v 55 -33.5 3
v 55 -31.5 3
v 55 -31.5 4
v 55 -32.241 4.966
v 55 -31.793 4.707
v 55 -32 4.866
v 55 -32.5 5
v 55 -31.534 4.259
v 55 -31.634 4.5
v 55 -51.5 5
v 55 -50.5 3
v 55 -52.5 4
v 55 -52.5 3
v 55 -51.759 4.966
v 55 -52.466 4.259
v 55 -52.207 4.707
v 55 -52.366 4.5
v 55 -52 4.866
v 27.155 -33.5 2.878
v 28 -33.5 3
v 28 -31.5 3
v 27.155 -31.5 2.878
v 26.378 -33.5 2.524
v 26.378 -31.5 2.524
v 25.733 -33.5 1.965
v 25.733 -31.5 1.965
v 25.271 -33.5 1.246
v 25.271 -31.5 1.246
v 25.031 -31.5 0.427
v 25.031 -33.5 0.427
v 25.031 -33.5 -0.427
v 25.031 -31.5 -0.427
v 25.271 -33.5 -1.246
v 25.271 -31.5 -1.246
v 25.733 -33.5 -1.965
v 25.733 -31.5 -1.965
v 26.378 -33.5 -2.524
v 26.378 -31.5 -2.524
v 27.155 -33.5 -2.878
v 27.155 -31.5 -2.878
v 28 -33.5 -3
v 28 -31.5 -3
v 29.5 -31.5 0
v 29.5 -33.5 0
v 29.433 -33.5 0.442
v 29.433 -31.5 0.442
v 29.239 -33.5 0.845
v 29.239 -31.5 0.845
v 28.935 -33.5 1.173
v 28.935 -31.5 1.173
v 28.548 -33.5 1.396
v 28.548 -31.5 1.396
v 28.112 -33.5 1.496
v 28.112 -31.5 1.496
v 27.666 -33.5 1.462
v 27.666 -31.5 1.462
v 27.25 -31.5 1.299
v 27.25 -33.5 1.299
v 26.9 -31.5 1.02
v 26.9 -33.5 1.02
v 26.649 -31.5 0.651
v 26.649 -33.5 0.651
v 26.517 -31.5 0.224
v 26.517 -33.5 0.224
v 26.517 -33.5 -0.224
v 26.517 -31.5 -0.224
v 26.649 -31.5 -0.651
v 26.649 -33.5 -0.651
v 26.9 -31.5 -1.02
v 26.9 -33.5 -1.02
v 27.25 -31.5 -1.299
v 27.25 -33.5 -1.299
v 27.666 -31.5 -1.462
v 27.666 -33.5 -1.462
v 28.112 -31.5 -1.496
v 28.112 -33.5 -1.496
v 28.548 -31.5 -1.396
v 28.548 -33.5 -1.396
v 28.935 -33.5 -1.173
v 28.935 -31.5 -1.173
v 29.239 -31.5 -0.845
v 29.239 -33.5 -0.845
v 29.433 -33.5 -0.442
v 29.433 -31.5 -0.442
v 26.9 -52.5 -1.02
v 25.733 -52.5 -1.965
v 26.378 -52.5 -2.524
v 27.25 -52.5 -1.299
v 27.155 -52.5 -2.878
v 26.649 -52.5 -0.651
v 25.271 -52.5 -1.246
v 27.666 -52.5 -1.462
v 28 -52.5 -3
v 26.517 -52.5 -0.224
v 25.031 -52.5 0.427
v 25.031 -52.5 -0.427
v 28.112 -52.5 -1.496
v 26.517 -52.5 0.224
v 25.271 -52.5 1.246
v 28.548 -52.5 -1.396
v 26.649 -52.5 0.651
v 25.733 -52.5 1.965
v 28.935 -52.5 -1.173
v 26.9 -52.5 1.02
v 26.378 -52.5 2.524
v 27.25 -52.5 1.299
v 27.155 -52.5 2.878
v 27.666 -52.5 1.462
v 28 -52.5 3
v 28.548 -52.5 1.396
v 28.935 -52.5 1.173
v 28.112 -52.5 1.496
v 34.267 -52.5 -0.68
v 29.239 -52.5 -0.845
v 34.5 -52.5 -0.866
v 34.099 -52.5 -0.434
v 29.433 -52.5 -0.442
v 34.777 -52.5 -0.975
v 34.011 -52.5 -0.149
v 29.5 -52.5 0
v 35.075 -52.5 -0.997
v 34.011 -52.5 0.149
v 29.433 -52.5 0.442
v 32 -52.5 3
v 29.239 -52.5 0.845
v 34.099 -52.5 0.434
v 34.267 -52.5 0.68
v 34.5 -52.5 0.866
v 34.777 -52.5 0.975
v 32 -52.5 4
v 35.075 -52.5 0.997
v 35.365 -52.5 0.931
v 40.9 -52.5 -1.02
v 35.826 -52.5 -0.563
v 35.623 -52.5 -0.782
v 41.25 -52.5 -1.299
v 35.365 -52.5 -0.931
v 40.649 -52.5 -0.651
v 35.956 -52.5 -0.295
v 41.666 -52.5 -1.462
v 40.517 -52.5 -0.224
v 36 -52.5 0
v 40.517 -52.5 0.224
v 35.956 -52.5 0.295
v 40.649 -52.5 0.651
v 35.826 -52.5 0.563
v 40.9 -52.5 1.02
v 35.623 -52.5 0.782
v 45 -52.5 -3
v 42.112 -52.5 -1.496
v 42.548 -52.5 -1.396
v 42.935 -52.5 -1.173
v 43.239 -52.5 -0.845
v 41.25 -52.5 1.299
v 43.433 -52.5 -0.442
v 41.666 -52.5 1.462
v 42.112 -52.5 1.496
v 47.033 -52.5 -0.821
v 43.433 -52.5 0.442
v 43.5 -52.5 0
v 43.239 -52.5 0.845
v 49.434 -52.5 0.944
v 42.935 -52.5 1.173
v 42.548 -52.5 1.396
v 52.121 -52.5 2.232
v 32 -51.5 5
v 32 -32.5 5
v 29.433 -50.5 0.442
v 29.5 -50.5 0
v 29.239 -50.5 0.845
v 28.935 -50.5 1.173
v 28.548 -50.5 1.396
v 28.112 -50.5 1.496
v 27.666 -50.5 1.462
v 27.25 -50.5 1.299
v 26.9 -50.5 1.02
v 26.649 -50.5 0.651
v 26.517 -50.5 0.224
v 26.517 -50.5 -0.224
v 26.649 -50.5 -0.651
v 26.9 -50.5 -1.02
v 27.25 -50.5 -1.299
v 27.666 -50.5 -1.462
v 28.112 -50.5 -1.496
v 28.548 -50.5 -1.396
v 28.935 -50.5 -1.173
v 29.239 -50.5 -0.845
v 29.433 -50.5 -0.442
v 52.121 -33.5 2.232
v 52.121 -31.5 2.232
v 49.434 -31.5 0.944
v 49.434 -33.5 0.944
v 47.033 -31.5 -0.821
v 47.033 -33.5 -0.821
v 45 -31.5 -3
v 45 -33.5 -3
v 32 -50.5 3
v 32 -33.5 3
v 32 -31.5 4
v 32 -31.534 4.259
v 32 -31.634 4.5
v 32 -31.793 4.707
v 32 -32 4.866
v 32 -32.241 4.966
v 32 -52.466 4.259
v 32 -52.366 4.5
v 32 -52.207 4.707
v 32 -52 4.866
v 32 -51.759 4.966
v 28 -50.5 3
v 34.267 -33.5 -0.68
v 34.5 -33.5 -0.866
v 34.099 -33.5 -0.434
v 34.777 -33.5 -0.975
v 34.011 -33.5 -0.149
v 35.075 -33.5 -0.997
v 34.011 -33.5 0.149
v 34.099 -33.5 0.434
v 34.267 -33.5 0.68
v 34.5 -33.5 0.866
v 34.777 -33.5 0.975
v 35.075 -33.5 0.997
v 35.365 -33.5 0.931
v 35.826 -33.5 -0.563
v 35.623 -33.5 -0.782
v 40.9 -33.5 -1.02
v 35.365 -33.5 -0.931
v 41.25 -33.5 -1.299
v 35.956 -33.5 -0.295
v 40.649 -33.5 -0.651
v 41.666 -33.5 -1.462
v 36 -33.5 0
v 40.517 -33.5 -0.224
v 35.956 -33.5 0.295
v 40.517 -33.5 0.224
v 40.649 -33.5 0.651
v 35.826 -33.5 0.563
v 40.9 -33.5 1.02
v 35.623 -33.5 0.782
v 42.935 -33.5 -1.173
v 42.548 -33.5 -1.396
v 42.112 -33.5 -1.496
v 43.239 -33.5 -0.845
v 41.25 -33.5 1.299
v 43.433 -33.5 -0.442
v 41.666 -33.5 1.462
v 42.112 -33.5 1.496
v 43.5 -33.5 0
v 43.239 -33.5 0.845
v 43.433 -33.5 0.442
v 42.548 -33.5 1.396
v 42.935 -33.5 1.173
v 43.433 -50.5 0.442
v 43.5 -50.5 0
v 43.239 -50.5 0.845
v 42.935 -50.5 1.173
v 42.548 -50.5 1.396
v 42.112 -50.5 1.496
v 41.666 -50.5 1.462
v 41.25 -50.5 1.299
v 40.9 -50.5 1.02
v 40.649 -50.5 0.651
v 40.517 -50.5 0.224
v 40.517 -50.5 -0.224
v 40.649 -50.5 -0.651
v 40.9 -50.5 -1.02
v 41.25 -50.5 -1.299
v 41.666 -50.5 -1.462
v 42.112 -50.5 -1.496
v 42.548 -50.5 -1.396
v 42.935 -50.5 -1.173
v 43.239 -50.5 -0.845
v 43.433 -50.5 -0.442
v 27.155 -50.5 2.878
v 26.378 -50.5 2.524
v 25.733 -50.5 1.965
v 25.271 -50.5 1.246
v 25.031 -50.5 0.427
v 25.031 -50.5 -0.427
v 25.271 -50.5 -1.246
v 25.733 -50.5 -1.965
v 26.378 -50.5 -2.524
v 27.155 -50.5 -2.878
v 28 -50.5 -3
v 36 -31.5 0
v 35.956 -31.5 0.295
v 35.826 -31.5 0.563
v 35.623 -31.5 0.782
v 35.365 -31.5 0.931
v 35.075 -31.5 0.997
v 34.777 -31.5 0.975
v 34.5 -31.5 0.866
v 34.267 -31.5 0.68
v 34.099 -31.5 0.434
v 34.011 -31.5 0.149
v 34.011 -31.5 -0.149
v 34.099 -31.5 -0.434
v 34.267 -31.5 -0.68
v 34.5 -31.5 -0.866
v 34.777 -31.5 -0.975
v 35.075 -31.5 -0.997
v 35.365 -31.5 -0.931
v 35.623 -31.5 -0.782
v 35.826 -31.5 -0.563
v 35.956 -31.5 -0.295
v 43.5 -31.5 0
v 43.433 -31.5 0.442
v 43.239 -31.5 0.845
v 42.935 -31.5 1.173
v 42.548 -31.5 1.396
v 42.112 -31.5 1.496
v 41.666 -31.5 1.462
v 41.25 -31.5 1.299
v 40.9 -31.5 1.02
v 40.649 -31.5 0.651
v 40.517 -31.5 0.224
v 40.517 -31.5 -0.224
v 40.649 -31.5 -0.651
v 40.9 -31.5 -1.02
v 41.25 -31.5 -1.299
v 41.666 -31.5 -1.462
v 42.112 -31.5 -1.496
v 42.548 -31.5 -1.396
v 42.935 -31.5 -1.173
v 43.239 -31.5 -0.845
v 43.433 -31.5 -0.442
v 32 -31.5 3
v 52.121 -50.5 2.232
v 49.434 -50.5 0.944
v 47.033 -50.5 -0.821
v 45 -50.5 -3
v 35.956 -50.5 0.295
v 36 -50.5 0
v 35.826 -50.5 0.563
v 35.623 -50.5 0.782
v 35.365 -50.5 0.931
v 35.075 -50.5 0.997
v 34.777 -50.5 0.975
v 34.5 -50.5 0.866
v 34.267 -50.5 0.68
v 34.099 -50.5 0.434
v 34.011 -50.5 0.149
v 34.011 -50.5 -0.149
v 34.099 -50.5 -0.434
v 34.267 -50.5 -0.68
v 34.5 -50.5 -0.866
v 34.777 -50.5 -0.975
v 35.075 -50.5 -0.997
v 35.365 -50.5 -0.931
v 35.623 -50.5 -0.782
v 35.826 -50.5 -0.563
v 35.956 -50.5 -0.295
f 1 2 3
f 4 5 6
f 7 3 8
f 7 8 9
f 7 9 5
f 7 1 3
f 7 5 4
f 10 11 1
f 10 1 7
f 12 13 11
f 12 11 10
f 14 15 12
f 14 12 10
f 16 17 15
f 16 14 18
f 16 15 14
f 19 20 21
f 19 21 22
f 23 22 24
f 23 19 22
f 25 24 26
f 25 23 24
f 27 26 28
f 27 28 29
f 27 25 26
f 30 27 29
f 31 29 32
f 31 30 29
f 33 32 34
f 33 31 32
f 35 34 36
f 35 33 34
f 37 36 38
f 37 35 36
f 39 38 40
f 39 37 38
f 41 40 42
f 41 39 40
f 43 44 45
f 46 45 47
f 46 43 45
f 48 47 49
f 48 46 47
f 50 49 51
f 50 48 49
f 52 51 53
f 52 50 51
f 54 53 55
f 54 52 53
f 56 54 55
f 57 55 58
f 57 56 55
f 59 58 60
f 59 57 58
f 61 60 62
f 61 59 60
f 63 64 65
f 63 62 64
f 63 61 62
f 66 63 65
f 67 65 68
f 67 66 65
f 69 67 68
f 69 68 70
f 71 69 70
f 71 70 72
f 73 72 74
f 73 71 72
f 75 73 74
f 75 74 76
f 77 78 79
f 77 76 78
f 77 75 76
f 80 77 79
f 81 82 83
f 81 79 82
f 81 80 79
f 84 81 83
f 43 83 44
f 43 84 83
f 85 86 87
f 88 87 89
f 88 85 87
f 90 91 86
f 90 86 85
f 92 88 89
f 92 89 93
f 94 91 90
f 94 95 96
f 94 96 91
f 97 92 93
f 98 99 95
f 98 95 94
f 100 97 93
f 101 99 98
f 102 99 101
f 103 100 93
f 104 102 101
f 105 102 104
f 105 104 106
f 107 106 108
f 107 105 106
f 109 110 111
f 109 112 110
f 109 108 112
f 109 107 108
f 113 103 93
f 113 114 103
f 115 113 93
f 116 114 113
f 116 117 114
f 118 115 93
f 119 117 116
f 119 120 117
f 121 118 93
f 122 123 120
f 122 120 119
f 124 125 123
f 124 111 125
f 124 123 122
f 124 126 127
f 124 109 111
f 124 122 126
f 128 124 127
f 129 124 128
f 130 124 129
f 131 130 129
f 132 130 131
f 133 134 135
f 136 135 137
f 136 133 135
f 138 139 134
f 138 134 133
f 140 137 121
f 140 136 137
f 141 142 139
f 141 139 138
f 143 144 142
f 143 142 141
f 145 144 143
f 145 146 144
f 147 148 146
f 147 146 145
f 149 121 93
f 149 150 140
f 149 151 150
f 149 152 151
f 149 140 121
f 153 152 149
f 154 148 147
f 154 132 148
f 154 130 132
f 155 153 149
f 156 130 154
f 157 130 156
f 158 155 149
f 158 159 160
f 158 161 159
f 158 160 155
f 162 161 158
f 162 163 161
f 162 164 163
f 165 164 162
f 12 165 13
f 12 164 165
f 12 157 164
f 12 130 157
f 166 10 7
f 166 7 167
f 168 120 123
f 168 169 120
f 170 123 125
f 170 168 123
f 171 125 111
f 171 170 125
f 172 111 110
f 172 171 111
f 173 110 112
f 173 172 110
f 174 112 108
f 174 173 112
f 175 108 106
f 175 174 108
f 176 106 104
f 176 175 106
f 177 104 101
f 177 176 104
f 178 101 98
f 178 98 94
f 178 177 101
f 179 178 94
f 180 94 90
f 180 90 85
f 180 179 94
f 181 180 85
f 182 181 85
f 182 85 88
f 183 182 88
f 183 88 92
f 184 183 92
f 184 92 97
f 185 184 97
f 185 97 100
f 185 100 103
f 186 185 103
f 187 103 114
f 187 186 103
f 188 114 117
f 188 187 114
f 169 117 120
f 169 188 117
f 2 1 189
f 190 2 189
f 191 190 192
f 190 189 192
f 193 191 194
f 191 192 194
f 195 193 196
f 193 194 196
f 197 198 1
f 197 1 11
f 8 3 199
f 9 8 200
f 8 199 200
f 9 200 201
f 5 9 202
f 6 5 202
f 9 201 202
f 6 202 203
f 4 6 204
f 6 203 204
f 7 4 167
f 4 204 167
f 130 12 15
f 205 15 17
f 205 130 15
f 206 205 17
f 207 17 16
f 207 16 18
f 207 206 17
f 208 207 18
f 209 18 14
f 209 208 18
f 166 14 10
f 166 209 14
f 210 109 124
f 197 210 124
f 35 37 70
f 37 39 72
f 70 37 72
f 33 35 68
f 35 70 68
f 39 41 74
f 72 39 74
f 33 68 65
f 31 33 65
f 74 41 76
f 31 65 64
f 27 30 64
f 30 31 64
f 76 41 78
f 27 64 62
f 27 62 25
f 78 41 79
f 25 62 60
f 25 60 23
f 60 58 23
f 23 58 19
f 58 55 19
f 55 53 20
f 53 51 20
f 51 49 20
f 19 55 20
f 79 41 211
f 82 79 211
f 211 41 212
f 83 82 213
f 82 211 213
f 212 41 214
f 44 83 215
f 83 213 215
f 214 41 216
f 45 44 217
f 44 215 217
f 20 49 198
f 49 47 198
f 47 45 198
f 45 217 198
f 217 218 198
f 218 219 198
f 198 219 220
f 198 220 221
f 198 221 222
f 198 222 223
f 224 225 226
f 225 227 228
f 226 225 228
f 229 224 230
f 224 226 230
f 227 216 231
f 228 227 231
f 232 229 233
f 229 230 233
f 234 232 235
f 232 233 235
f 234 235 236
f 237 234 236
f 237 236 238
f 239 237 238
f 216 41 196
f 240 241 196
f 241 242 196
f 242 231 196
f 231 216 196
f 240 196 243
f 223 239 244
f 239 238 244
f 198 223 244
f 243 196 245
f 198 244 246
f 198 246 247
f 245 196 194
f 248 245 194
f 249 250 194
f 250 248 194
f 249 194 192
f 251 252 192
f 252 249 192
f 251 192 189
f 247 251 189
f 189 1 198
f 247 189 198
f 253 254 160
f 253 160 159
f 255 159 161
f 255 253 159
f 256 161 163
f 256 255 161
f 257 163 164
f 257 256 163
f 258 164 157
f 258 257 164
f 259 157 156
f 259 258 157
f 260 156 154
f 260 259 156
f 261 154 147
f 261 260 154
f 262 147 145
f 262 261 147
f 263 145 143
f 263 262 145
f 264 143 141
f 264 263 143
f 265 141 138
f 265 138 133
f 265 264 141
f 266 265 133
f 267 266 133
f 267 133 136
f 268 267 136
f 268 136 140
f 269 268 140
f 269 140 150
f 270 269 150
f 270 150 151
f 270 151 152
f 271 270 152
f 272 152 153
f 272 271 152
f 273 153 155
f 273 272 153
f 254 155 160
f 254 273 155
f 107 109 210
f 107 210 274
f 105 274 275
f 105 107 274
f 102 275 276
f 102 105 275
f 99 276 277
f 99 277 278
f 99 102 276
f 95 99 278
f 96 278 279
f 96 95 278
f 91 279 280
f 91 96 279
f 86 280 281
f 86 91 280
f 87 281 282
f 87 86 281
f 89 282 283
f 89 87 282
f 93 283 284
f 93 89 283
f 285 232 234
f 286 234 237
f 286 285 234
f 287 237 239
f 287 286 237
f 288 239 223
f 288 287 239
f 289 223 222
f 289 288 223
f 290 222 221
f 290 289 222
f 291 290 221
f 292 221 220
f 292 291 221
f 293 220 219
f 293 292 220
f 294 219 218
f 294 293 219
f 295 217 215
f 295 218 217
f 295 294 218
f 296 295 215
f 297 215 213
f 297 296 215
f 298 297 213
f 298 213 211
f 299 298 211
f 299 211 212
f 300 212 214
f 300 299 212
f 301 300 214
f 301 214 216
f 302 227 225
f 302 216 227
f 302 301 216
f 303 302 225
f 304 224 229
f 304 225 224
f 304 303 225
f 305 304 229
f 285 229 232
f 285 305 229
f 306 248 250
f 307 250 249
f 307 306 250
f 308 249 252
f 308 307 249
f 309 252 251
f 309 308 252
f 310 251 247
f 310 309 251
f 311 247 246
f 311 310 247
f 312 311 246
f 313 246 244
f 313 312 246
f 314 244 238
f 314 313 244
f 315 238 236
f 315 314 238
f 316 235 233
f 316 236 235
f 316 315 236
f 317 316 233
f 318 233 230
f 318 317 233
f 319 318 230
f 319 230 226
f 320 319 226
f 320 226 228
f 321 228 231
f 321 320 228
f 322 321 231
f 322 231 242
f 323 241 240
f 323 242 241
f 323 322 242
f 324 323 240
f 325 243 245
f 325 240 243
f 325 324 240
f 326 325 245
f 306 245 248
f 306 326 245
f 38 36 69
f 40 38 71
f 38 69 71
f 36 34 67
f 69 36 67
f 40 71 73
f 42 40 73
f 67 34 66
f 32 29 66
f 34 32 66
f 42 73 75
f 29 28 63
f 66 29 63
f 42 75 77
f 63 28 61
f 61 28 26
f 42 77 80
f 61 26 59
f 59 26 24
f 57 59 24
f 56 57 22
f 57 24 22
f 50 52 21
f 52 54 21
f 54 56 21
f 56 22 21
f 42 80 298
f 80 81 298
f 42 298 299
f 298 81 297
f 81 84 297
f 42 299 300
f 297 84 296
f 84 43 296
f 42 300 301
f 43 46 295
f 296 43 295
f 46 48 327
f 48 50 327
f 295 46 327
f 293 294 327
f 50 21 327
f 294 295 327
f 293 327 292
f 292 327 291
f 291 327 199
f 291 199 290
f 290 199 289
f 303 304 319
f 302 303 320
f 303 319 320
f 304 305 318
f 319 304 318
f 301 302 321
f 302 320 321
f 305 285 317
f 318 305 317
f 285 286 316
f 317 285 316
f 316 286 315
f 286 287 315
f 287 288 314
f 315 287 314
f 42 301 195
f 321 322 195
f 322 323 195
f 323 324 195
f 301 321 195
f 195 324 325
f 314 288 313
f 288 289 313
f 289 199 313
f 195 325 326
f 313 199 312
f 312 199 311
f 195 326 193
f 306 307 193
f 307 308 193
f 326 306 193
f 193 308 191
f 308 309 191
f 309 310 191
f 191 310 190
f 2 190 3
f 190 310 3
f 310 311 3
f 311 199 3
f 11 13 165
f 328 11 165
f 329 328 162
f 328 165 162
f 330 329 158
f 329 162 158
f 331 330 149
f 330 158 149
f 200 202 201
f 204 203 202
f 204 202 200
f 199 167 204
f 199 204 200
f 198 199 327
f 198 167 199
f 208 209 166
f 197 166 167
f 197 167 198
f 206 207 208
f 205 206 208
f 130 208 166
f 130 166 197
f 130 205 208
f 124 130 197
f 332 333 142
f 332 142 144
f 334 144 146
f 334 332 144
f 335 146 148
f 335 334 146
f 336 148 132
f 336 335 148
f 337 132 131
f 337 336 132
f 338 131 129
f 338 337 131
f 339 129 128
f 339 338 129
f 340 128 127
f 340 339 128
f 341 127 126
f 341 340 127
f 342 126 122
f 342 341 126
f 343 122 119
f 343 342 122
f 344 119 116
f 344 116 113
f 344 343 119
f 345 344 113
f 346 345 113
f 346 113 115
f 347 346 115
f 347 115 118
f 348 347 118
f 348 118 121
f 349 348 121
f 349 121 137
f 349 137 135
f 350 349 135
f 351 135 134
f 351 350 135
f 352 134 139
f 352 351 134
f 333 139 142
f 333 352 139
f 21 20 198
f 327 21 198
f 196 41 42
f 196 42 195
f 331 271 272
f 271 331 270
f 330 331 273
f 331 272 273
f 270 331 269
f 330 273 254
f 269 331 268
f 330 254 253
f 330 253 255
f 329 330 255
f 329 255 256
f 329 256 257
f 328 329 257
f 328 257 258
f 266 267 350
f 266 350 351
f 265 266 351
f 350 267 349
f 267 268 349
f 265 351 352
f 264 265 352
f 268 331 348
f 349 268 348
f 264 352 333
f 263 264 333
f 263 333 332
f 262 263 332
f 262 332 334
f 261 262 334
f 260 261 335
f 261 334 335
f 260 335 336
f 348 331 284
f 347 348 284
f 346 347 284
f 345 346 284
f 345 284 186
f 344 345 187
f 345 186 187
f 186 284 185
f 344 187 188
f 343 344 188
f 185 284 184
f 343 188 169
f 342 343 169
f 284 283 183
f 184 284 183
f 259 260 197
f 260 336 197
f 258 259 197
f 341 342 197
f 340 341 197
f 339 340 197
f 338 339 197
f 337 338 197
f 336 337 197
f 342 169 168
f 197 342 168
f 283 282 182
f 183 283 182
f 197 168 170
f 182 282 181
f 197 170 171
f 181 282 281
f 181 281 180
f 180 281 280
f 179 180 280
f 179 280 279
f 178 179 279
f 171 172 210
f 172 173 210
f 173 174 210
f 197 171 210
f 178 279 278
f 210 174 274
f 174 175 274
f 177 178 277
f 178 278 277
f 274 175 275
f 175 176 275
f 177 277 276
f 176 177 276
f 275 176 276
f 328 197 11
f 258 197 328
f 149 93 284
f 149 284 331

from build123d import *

# Parameters (mm, degrees)
SKETCH002_R       = 1.5
SKETCH002_R_2     = 1
PAD002_DEPTH      = 10.5
SKETCH003_W       = 17
SKETCH003_H       = 9.673154
POCKET_DEPTH      = 27.001
POCKET_DEPTH_BACK = 3.001
FILLET002_R       = 1


with BuildPart() as part:
    # Sketch002 → Pad002 (new body, symmetric)
    with BuildSketch(Plane.XZ):
        with BuildLine():
            ThreePointArc((0, 3), (-3, 0), (0, -3))
            Line((0, -3), (17, -3))
            ThreePointArc((27, 3), (21.433882, 0.94353), (17, -3))
            Line((27, 3), (27, 5))
            Line((27, 5), (4, 5))
            Line((4, 5), (4, 3))
            Line((0, 3), (4, 3))
        make_face()
        Circle(SKETCH002_R, mode=Mode.SUBTRACT)
        with Locations((7, 0)):
            Circle(SKETCH002_R_2, mode=Mode.SUBTRACT)
        with Locations((14, 0)):
            Circle(SKETCH002_R, mode=Mode.SUBTRACT)
    extrude(amount=PAD002_DEPTH, both=True)

    # Sketch003 → Pocket (cut, two sides)
    with BuildSketch(Plane(origin=(0, 0, 0), x_dir=(0, -1, 0), z_dir=(-1, 0, 0))) as pocket_sk:
        with Locations((0, -1.836577)):
            Rectangle(SKETCH003_W, SKETCH003_H)
    extrude(amount=-POCKET_DEPTH, mode=Mode.SUBTRACT)
    extrude(pocket_sk.sketch, amount=POCKET_DEPTH_BACK, mode=Mode.SUBTRACT)

    # Fillet002
    fillet002_edges = [part.edges().sort_by_distance(p)[0] for p in [
        (15.5, 10.5, 5),
        (15.5, -10.5, 5),
    ]]
    fillet(fillet002_edges, radius=FILLET002_R)


with BuildPart() as part_1:
    # Body001 placement: moved
    add(part.part.moved(Location((28, -42, 0))))


solid = part_1.part
